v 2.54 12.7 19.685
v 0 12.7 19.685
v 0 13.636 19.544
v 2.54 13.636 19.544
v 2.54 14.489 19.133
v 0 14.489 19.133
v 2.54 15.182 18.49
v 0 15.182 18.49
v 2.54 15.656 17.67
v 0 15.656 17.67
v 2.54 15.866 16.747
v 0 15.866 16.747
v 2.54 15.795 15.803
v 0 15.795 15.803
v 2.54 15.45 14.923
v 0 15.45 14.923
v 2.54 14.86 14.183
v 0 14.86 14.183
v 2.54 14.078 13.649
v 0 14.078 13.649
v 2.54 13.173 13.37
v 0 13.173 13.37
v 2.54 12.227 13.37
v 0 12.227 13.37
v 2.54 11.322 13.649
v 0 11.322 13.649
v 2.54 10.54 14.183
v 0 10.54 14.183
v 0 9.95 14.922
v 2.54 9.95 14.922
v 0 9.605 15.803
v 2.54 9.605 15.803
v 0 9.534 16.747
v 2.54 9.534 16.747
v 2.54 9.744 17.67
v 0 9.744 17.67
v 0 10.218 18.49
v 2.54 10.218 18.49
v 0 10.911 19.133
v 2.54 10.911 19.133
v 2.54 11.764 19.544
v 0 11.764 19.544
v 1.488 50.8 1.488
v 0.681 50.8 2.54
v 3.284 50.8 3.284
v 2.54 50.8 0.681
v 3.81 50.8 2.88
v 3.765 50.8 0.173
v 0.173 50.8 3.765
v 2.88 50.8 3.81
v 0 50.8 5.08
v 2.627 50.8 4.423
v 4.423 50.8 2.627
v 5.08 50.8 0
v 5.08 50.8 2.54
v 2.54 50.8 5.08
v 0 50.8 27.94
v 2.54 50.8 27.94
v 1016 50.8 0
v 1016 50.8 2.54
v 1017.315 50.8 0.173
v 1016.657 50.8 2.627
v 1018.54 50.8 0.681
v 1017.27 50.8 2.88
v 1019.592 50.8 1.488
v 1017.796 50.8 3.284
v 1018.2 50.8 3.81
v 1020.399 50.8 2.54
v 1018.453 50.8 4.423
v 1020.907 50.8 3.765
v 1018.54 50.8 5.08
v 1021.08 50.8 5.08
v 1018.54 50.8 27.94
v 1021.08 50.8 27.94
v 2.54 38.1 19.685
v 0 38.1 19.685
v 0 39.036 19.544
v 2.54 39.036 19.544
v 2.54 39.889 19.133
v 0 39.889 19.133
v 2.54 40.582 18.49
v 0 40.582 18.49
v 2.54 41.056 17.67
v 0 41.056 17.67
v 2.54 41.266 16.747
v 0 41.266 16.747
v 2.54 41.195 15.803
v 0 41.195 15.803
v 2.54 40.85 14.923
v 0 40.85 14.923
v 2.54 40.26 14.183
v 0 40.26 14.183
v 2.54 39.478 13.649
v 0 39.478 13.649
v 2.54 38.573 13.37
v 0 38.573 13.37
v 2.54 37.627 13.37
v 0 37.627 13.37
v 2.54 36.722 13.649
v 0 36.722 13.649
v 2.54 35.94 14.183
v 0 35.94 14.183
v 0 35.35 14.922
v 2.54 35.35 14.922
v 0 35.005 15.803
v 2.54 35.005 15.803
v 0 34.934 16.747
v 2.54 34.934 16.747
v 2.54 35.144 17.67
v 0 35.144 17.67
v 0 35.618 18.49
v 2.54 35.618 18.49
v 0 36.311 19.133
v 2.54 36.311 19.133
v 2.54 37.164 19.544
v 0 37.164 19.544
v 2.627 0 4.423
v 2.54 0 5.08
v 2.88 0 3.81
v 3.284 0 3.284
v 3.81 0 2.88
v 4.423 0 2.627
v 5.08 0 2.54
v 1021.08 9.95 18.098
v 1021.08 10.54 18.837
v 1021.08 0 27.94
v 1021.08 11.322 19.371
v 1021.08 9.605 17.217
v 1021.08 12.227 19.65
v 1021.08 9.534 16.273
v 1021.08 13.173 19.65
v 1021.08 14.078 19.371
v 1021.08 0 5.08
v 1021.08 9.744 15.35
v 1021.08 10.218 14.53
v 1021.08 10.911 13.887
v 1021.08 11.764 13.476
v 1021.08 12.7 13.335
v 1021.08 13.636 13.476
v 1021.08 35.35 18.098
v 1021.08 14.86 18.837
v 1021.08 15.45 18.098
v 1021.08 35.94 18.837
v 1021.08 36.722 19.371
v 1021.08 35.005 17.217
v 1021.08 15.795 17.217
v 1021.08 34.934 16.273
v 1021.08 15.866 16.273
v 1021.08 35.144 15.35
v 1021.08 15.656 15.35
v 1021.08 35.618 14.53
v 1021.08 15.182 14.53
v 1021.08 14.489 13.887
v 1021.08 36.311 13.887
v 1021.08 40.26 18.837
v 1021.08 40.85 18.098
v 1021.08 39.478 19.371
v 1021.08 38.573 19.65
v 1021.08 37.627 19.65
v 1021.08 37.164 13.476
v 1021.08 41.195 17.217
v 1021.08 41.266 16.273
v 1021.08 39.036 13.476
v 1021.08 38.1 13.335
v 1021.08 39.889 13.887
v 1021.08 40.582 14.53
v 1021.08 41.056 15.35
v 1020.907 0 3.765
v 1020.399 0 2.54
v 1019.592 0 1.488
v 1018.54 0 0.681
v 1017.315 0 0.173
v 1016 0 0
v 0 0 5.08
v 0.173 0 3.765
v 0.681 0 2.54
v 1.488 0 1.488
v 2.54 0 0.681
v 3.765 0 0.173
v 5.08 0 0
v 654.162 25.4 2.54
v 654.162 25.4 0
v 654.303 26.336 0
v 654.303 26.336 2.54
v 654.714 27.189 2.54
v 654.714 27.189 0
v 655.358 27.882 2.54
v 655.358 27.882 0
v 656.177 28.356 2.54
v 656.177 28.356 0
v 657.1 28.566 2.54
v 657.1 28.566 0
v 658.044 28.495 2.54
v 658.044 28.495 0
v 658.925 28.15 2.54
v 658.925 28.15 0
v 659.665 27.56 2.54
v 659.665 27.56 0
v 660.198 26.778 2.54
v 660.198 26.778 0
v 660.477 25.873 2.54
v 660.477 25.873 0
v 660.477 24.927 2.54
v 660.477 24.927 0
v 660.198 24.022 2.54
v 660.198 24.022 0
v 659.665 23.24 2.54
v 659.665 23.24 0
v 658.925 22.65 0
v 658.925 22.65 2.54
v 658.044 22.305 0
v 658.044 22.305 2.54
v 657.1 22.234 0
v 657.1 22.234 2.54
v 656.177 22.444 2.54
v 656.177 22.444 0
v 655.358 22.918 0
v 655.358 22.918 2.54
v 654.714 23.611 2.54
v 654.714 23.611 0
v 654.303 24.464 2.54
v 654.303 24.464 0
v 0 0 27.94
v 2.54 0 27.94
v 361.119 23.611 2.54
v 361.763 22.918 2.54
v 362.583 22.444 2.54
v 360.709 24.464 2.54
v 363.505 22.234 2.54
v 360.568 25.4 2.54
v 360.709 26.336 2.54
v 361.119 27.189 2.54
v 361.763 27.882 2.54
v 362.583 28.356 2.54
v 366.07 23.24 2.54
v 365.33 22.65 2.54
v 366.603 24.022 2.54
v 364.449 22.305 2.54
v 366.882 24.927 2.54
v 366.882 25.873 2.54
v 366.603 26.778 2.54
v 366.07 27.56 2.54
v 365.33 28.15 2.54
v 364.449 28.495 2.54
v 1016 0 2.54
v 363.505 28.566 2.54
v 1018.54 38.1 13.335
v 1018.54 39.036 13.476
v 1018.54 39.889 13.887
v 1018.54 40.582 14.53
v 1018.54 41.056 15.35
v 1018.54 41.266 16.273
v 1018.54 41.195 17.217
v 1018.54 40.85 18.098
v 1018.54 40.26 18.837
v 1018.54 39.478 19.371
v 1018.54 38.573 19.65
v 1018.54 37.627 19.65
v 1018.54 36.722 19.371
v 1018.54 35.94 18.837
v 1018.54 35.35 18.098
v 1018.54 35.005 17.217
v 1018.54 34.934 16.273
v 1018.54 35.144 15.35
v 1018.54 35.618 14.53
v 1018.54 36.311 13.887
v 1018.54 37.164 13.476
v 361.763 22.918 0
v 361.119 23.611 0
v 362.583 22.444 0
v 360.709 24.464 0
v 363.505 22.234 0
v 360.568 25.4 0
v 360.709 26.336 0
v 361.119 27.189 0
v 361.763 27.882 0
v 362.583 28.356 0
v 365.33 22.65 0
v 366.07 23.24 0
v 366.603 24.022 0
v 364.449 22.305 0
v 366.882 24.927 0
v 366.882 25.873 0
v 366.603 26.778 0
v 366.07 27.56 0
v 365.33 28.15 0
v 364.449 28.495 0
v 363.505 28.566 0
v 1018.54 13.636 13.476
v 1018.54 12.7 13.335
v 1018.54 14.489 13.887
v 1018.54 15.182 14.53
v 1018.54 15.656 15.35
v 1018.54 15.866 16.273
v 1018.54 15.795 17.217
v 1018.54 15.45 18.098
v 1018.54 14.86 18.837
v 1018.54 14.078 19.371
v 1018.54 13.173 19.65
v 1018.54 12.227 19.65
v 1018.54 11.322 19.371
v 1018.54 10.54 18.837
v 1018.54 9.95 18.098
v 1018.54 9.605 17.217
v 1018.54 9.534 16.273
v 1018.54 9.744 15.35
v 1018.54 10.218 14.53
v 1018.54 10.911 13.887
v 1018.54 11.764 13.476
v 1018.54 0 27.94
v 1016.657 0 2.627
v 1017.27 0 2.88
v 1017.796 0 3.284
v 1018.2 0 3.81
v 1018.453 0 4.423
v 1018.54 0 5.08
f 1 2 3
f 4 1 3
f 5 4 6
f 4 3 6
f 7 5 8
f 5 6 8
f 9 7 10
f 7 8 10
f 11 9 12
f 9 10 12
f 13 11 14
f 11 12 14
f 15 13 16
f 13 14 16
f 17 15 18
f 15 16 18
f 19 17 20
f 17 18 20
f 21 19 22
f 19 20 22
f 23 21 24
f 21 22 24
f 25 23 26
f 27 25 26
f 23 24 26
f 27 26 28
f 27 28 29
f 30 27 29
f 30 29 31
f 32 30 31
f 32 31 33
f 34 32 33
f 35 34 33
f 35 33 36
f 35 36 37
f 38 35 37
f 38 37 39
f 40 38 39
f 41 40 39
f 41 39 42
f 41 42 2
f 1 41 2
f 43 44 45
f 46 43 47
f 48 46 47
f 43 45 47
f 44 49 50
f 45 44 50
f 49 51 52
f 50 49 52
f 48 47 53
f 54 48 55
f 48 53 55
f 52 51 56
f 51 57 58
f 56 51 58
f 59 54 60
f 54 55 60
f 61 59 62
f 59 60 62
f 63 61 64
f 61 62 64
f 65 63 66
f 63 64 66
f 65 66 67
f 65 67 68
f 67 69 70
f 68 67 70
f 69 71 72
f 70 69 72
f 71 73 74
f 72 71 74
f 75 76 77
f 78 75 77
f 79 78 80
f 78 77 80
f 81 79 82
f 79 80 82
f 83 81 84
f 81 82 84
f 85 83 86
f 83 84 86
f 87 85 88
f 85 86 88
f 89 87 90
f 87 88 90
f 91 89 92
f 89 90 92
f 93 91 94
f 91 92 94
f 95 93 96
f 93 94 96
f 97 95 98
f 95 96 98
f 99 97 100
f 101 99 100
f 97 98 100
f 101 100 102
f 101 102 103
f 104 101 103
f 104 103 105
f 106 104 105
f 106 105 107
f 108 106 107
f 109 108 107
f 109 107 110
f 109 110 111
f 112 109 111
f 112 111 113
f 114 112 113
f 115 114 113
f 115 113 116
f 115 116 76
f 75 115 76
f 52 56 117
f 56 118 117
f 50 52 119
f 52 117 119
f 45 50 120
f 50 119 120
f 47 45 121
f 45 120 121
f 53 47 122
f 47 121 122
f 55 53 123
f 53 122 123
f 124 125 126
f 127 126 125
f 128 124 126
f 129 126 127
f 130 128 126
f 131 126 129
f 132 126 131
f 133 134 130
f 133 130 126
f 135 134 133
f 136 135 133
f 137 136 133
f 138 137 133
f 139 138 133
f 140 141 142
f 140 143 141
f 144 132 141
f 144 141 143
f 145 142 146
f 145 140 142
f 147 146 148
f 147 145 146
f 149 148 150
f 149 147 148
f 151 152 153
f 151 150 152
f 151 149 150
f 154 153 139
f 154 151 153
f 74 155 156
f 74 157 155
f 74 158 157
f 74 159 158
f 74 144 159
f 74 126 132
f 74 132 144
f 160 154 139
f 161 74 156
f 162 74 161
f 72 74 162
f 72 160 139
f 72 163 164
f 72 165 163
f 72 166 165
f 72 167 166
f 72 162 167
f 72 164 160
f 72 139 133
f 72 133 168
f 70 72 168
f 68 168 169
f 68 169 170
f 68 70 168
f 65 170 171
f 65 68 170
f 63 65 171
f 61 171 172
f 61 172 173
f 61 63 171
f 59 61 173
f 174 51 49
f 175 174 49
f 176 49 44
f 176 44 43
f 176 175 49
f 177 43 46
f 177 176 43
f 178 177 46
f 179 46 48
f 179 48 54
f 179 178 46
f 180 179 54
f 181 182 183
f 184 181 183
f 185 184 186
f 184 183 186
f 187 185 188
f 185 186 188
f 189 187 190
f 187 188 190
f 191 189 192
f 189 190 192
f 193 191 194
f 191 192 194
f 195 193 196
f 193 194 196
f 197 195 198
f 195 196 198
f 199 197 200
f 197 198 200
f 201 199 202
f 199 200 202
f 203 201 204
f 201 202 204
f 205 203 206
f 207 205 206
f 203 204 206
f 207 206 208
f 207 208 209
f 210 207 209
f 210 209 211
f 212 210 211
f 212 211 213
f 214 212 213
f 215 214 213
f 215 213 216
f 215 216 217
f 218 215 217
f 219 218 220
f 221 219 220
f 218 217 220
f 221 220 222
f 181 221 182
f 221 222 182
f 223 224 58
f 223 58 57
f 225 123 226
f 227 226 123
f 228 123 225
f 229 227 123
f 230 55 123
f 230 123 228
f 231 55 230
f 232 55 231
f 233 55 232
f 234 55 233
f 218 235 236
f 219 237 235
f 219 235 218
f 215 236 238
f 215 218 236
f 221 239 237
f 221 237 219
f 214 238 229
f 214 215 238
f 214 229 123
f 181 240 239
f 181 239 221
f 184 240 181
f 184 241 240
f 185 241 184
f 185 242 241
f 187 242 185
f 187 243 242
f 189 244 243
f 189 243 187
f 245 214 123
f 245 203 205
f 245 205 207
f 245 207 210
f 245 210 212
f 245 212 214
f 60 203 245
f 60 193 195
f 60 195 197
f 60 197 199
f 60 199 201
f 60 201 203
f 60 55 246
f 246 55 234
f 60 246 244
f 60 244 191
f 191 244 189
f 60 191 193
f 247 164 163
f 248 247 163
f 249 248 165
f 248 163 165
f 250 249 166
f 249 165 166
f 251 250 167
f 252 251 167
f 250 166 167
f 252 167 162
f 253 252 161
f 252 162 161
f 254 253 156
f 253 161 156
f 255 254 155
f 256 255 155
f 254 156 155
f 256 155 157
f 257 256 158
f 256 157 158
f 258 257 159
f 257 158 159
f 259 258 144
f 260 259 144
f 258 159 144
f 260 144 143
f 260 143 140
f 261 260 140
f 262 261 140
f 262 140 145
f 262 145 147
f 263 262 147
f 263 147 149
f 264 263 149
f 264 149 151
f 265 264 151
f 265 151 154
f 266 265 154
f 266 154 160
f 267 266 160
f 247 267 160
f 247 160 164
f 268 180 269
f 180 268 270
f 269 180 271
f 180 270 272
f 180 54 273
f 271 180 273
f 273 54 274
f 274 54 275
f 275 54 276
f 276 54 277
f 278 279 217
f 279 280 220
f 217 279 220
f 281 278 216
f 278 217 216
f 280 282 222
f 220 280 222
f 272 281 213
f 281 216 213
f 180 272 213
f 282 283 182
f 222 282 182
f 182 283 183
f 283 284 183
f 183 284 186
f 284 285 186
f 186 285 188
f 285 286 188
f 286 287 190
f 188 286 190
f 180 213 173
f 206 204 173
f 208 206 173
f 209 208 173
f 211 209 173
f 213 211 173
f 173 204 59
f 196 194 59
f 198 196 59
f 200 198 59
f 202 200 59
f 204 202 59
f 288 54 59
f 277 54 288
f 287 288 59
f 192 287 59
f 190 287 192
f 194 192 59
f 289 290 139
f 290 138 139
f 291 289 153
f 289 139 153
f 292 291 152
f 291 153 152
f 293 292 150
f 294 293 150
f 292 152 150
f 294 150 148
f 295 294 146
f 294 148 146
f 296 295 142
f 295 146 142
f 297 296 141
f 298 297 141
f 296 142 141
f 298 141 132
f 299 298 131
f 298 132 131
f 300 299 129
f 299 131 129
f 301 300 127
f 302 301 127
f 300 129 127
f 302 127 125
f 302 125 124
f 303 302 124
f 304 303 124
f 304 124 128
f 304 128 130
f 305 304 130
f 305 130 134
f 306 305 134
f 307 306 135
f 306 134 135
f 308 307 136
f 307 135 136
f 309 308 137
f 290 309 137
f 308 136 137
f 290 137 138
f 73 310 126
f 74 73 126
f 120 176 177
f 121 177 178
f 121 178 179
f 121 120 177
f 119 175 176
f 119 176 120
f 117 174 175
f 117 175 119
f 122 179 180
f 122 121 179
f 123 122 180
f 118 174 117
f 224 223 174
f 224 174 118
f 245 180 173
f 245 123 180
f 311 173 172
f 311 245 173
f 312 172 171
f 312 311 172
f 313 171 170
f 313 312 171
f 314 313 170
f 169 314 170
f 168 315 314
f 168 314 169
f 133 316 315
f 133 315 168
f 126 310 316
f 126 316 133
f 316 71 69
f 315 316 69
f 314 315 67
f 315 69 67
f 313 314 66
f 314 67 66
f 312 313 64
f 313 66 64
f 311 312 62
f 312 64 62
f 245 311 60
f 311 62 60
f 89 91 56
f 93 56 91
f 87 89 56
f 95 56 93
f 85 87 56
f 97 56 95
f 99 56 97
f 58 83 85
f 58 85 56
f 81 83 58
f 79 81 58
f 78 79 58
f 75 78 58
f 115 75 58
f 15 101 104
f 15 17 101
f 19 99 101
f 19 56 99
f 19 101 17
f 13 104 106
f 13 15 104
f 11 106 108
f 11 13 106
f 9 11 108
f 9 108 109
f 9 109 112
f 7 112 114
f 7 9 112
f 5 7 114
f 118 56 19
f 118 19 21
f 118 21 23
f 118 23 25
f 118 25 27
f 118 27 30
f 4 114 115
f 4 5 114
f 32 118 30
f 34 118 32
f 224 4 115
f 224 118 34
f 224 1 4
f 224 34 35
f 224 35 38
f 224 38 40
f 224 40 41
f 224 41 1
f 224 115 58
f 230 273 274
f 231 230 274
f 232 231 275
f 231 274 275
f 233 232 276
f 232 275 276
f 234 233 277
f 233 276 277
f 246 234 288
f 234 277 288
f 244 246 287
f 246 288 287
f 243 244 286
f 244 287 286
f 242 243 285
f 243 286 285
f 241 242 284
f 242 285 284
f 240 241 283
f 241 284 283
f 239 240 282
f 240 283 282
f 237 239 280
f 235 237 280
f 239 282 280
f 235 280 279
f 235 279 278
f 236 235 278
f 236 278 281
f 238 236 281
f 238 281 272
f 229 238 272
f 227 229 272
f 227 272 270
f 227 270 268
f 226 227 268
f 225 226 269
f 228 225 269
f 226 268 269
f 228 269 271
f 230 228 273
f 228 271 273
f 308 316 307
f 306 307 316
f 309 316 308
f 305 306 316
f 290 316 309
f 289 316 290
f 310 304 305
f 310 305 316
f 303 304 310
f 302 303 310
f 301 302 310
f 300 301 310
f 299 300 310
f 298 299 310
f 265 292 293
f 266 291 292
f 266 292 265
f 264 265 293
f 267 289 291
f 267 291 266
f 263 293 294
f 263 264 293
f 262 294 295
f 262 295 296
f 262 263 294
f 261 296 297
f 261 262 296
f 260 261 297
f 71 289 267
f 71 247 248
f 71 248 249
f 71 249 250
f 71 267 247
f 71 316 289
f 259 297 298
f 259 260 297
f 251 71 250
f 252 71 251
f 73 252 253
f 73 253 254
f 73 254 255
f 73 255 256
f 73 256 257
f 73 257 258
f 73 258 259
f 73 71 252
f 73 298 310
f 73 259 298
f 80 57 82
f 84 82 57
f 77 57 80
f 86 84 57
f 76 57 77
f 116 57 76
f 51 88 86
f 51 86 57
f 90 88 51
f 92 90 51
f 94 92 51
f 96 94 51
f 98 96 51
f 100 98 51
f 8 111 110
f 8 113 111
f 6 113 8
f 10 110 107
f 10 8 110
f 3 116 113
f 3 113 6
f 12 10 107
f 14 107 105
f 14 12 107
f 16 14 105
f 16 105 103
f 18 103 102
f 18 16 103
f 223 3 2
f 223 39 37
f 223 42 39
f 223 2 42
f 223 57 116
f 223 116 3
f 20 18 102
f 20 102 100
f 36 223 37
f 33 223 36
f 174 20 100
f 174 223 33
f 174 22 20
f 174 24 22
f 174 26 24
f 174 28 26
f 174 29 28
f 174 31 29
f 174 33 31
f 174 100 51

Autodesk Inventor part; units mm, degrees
ref_plane "YZ Plane" through (0, 0, 0) normal (1, 0, 0) x (0, 1, 0)
ref_plane "XZ Plane" through (0, 0, 0) normal (0, 1, 0) x (-1, 0, 0)
ref_plane "XY Plane" through (0, 0, 0) normal (0, 0, 1) x (1, 0, 0)
sketch "Sketch1" plane through (0, 0, 0) normal (0, 0, 1) x (1, 0, 0)
  line L0 (0, 0) -> (1021.08, 0)
  line L1 (1021.08, 0) -> (1021.08, 50.8)
  line L2 (1021.08, 50.8) -> (0, 50.8)
  line L3 (0, 50.8) -> (0, 0)
  dimension "d0" = 1021.08
  dimension "d1" = 50.8
extrude "Plate1" add sketch "Sketch1" along normal blind 2.54
sketch "Sketch2" plane through (2.54, 0, 0) normal (-1, 0, 0) x (0, -1, 0)
  line L0 (-50.8, 0) -> (0, 0)
  line L1 (0, 0) -> (0, 27.94)
  line L2 (0, 27.94) -> (-50.8, 27.94)
  line L3 (-50.8, 27.94) -> (-50.8, 0)
edge flange "Flange1" height 27.94 angle 90 thickness 2.54 bend radius 2.54 thickness toward (-1, 0, 0) relief tear relief width 2.54 relief depth 1.27 corner gap 2.54 corner form 0 edges at (0, 25.4, 2.54) (1021.08, 25.4, 2.54) wall of the first edge with corners at (2.54, 50.8, 0) (2.54, 0, 0) (2.54, 0, 27.94) (2.54, 50.8, 27.94)
bend "Bend1"
corner "Corner1"
sketch "Sketch3" plane through (0, 0, 0) normal (0, 0, -1) x (-1, 0, 0)
  circle A0 centre (-317.326, 37.1303) radius 3.175 projected
  circle A1 centre (-657.3374, 25.4) radius 3.175 projected
  circle A2 centre (-363.7426, 25.4) radius 3.175 projected
  point P0 (0, 0)
extrude "Extrusion1" cut sketch "Sketch3" against normal blind 25.4 contours A1 | A2
sketch "Sketch4" plane through (1021.08, 0, 27.94) normal (1, 0, 0) x (0, 0, -1)
  line L0 (0, 0) -> (22.86, 0)
  line L1 (22.86, 0) -> (22.86, 50.8)
  line L2 (22.86, 50.8) -> (0, 50.8)
  line L3 (0, 50.8) -> (0, 0)
  circle A0 centre (11.43, 38.1) radius 3.175
  circle A1 centre (11.43, 12.7) radius 3.175
  point P0 (27.94, 0)
  dimension "d15" = 6.35
  dimension "d16" = 6.35
extrude "Extrusion2" cut sketch "Sketch4" against normal blind 2.54 contours A0 | A1
sketch "Sketch5" plane through (0, 0, 27.94) normal (-1, 0, 0) x (0, 0, 1)
  line L0 (0, 50.8) -> (-22.86, 50.8)
  line L1 (-22.86, 50.8) -> (-22.86, 0)
  line L2 (-22.86, 0) -> (0, 0)
  line L3 (0, 0) -> (0, 50.8)
  circle A0 centre (-11.43, 38.1) radius 3.175 projected
  circle A1 centre (-11.43, 12.7) radius 3.175 projected
  circle A2 centre (-11.43, 12.7) radius 3.175
  circle A3 centre (-11.43, 38.1) radius 3.175
  point P0 (-27.94, 0)
extrude "Extrusion3" cut sketch "Sketch5" against normal blind 2.54 contours A0 | A1
equation "\"d3\" = BendReliefWidth"
equation "\"d4\" = BendReliefDepth"
equation "\"d5\" = MinimumRemnant"
equation "\"d6\" = BendRadius"
equation "\"d9\" = BendRadius"
equation "\"d10\" = CornerReliefSize"
equation "\"d11\" = GapSize"
equation "\"d12\" = JacobiRadiusSize"
equation "\"BendRadius\" = Thickness"
equation "\"BendReliefWidth\" = Thickness"
equation "\"BendReliefDepth\" = 0.5 * Thickness"
equation "\"CornerReliefSize\" = 4 * Thickness"
equation "\"MinimumRemnant\" = 2 * Thickness"
equation "\"TransitionRadius\" = BendRadius"
equation "\"JacobiRadiusSize\" = BendRadius"
equation "\"GapSize\" = Thickness"
equation "\"d2\" = BendRadius"
equation "\"Thickness\" = 2.54"
properties part number "bumper piece"
